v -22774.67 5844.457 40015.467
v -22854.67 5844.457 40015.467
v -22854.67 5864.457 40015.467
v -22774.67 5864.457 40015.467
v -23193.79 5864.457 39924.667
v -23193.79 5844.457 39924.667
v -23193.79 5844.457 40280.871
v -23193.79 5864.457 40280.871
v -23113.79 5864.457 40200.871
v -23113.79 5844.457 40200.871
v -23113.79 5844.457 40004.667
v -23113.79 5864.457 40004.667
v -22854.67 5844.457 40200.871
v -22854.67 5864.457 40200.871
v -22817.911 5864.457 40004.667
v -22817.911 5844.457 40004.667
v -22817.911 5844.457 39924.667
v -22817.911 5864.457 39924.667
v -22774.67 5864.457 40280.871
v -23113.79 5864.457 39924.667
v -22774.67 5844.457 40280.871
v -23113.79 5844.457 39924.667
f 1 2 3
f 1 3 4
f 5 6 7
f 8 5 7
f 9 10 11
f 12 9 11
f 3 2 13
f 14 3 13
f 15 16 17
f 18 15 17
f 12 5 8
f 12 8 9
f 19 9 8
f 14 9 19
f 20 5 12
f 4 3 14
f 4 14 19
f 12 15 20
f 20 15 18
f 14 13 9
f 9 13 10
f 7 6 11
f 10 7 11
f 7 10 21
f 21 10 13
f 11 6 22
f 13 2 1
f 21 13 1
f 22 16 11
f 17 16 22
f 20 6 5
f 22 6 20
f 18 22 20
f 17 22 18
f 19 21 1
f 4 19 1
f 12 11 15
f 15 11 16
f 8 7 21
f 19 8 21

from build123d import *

# Parameters (mm, degrees)
BOSS_EXTRUDE1_START = 550
SKETCH1_W           = 80
SKETCH1_H           = 276.203950277
SKETCH1_W_2         = 295.879209743
SKETCH1_H_2         = 80
SKETCH1_H_3         = 12.7
BOSS_EXTRUDE1_DEPTH = 20


with BuildPart() as part:
    # Sketch1 → Boss-Extrude1 (new body)
    with BuildSketch(Plane(origin=(0, 5294.457128547, 0), x_dir=(1, 0, 0), z_dir=(0, 1, 0)).offset(BOSS_EXTRUDE1_START)):
        with Locations((-23153.790093454, -40062.769337853)):
            Rectangle(SKETCH1_W, SKETCH1_H)
        Polygon((-23113.790093454, -40200.871312991), (-23193.790093454, -40200.871312991), (-23193.790093454, -40280.871312991), (-22854.669978064, -40280.871312991), (-22854.669978064, -40200.871312991), align=None)
        Polygon((-22854.669978064, -40028.167362714), (-22854.669978064, -40200.871312991), (-22854.669978064, -40280.871312991), (-22774.669978064, -40280.871312991), (-22774.669978064, -40028.167362714), align=None)
        with Locations((-22965.850488583, -39964.667362714)):
            Rectangle(SKETCH1_W_2, SKETCH1_H_2)
        with Locations((-22814.669978064, -40021.817362714)):
            Rectangle(SKETCH1_W, SKETCH1_H_3)
    extrude(amount=BOSS_EXTRUDE1_DEPTH)


solid = part.part
